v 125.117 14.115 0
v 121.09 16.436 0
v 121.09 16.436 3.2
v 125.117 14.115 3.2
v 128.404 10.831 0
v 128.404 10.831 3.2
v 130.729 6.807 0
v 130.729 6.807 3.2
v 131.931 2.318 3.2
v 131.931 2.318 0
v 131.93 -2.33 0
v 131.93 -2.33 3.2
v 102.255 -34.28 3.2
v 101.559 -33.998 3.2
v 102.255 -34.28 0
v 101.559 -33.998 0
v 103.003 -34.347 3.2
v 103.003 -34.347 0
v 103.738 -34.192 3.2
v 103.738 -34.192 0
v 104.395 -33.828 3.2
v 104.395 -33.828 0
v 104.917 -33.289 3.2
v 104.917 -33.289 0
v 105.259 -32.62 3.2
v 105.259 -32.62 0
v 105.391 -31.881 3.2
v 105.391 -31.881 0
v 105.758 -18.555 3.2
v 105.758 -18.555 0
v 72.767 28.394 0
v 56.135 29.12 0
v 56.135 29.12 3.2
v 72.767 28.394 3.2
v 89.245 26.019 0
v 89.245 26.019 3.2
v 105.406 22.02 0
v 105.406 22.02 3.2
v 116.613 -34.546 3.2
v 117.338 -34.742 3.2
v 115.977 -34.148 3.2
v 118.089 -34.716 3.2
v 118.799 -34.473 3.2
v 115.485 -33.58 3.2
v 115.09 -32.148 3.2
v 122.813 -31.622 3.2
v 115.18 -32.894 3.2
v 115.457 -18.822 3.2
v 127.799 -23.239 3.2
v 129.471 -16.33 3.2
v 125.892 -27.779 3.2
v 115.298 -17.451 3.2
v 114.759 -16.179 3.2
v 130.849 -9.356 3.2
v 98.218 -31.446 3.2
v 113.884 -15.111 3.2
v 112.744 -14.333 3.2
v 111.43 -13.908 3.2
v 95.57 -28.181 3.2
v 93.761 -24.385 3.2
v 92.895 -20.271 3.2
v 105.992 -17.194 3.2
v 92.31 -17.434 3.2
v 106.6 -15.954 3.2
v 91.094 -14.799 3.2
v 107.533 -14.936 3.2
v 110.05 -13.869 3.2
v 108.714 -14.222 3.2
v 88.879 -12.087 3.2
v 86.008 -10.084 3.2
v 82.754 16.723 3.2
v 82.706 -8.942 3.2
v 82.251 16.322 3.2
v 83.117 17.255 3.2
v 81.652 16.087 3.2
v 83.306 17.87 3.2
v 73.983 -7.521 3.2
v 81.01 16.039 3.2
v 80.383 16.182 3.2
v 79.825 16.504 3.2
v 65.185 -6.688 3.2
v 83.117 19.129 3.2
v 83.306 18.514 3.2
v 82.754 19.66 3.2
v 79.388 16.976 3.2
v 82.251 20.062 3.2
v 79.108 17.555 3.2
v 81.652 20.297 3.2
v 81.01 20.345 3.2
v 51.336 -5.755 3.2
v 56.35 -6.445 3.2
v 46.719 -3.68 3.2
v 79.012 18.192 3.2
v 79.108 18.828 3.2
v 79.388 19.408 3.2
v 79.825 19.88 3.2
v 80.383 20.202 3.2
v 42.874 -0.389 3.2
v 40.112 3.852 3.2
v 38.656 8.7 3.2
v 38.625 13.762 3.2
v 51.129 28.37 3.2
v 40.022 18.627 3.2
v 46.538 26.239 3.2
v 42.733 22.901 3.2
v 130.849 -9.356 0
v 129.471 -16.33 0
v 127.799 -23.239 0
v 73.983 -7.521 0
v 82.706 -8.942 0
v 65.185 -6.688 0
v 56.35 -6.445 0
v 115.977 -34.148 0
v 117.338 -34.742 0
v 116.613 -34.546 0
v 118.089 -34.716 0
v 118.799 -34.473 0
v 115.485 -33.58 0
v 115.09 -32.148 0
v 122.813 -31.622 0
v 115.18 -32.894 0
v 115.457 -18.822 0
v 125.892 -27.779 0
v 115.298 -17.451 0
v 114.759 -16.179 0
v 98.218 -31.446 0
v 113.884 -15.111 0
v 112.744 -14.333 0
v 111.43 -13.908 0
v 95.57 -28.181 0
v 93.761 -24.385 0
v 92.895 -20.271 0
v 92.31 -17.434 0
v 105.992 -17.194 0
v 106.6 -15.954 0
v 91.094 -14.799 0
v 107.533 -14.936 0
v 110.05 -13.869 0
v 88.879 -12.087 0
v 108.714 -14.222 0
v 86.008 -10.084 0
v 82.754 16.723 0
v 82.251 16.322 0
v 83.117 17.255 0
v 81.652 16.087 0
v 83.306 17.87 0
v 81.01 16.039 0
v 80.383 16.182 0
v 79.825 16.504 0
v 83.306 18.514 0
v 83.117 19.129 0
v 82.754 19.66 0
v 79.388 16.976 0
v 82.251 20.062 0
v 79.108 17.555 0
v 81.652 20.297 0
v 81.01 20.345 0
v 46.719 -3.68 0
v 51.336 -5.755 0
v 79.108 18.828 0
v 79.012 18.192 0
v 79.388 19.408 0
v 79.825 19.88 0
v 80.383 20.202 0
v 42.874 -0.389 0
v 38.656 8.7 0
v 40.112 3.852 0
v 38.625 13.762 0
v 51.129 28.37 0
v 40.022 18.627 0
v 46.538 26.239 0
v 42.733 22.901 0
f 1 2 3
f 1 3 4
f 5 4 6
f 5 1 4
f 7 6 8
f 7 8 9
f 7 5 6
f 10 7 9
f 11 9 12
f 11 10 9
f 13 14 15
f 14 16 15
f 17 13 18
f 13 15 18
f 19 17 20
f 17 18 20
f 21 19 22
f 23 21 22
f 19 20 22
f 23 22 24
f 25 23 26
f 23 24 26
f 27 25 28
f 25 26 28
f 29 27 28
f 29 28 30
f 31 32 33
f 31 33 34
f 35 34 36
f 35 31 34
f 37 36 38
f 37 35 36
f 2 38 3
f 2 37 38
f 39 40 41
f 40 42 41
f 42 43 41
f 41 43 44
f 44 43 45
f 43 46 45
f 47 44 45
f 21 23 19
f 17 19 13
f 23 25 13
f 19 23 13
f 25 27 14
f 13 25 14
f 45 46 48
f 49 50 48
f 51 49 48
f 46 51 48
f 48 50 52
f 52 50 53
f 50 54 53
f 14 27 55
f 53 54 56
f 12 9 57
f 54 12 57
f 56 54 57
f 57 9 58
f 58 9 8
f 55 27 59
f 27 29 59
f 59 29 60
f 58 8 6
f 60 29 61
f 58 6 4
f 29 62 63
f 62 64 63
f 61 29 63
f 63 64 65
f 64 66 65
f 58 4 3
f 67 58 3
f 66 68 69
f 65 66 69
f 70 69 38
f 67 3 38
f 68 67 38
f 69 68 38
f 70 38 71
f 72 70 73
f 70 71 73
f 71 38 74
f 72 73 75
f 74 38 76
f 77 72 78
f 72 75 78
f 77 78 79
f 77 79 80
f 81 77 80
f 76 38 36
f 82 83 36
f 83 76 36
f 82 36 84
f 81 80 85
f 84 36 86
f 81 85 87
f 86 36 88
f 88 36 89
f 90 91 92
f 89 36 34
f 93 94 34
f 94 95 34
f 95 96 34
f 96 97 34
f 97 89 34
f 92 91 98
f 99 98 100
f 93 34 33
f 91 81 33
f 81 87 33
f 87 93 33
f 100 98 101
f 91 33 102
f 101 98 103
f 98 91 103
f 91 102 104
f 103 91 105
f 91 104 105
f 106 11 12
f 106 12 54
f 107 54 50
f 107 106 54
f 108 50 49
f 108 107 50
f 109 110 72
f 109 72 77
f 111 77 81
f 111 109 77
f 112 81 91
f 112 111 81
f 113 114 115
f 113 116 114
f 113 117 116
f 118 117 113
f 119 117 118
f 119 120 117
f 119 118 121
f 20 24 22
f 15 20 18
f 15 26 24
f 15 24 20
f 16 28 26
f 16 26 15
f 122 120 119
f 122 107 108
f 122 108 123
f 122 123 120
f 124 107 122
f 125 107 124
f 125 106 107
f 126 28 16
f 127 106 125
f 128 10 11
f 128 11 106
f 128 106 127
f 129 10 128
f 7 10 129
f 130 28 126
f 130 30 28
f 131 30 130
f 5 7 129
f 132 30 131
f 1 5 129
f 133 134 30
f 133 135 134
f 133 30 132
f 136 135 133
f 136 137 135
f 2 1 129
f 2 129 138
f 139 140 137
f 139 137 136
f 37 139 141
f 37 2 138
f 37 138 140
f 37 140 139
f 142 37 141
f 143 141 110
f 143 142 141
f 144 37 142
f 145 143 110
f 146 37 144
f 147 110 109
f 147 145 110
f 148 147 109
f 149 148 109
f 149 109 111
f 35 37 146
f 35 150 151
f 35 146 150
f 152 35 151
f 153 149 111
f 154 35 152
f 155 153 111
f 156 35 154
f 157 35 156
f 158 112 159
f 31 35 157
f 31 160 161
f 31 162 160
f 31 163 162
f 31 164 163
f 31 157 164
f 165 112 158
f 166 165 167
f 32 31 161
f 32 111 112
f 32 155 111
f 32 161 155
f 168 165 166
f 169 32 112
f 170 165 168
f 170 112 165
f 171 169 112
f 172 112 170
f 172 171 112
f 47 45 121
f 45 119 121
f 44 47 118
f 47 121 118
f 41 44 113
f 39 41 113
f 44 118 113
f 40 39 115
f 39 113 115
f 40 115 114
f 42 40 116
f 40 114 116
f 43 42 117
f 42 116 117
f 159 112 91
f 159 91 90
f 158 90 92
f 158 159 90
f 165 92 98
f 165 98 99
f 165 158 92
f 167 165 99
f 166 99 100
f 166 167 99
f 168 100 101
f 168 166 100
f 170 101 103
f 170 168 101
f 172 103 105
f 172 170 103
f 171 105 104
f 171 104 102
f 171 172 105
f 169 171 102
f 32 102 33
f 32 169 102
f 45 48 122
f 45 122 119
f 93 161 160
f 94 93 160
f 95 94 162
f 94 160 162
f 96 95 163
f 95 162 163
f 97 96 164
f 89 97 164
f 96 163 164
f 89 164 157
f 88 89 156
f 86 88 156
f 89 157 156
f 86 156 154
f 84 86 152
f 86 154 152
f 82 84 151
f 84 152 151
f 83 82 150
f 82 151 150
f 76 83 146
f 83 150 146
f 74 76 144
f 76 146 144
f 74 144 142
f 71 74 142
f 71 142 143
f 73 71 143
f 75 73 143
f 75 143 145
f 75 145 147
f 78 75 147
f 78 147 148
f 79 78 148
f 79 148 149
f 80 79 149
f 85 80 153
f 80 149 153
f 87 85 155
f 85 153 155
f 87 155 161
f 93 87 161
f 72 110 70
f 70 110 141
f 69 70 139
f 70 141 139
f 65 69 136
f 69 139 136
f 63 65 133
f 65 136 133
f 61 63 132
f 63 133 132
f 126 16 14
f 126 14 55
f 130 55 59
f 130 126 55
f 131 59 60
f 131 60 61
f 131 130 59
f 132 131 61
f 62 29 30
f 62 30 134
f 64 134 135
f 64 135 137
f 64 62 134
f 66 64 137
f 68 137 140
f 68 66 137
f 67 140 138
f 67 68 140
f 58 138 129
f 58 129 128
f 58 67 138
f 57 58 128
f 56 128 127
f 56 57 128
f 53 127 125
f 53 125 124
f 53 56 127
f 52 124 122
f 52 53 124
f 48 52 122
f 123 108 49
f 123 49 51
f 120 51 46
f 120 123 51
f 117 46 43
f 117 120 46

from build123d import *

# Parameters (mm, degrees)
BOSS_EXTRUDE1_DEPTH = 3.2004
BOSS_EXTRUDE2_START = -3.2004
BOSS_EXTRUDE2_DEPTH = 3.2004
FILLET1_R           = 12.7
CUT_EXTRUDE3_DEPTH  = 3.2004
FILLET2_R           = 2.54
SKETCH9_R           = 2.159
CUT_EXTRUDE4_DEPTH  = 3.2004
CUT_EXTRUDE5_DEPTH  = 3.2004


with BuildPart() as part:
    # Sketch1 → Boss-Extrude1 (new body)
    with BuildSketch(Plane.XY):
        with BuildLine():
            ThreePointArc((-6.790095085, 16.435726481), (57.15, 29.123460788), (121.090095085, 16.435726481))
            ThreePointArc((121.090095085, 16.435726481), (130.735726481, -6.790095085), (107.509904915, -16.435726481))
            ThreePointArc((107.509904915, -16.435726481), (57.15, -6.442730812), (6.790095085, -16.435726481))
            ThreePointArc((6.790095085, -16.435726481), (-16.435726481, -6.790095085), (-6.790095085, 16.435726481))
        make_face()
    extrude(amount=BOSS_EXTRUDE1_DEPTH)

    # Sketch3 → Boss-Extrude2 (add)
    with BuildSketch(Plane.XY.offset(3.2004).offset(BOSS_EXTRUDE2_START)):
        with BuildLine():
            ThreePointArc((96.670173634, 2.329746452), (116.629746452, 17.629826366), (131.929826366, -2.329746452))
            ThreePointArc((131.929826366, -2.329746452), (130.197200475, -12.850112517), (127.798590387, -23.238893209))
            ThreePointArc((127.798590387, -23.238893209), (106.05729345, -35.879818808), (93.416367852, -14.138521872))
            ThreePointArc((93.416367852, -14.138521872), (95.305538892, -5.956206736), (96.670173634, 2.329746452))
        make_face()
    extrude(amount=BOSS_EXTRUDE2_DEPTH)

    # Fillet1
    fillet1_edges = [part.edges().sort_by_distance(p)[0] for p in [
        (94.035611584, -11.705568295, 1.6002),
    ]]
    fillet(fillet1_edges, radius=FILLET1_R)

    # Sketch7 → Cut-Extrude3 (cut)
    with BuildSketch(Plane.XY.offset(3.2004)):
        with BuildLine():
            Line((115.457037918, -18.822354151), (114.672565979, -47.28804272))
            Line((114.672565979, -47.28804272), (104.973448381, -47.020749498))
            Line((104.973448381, -47.020749498), (105.75792032, -18.55506093))
            ThreePointArc((105.75792032, -18.55506093), (110.74112573, -13.839148742), (115.457037918, -18.822354151))
        make_face()
    extrude(amount=-CUT_EXTRUDE3_DEPTH, mode=Mode.SUBTRACT)

    # Fillet2
    fillet2_edges = [part.edges().sort_by_distance(p)[0] for p in [
        (105.286613182, -35.65711589, 1.6002),
        (114.98573078, -35.924409111, 1.6002),
    ]]
    fillet(fillet2_edges, radius=FILLET2_R)

    # Sketch9 → Cut-Extrude4 (cut)
    with BuildSketch(Plane(origin=(0, 0, 0), x_dir=(-1, 0, 0), z_dir=(0, 0, -1))):
        with Locations((-81.171495532, 18.191790938)):
            Circle(SKETCH9_R)
    extrude(amount=-CUT_EXTRUDE4_DEPTH, mode=Mode.SUBTRACT)

    # Sketch10 → Cut-Extrude5 (cut)
    with BuildSketch(Plane(origin=(0, 0, 0), x_dir=(-1, 0, 0), z_dir=(0, 0, -1))):
        with BuildLine():
            Line((-56.134756458, 29.120383205), (25.761959957, 49.584410296))
            Line((25.761959957, 49.584410296), (33.027370327, -48.953888357))
            Line((33.027370327, -48.953888357), (-56.350383293, -6.445154749))
            ThreePointArc((-56.350383293, -6.445154749), (-38.459800898, 11.22980081), (-56.134756458, 29.120383205))
        make_face()
    extrude(amount=-CUT_EXTRUDE5_DEPTH, mode=Mode.SUBTRACT)


solid = part.part
